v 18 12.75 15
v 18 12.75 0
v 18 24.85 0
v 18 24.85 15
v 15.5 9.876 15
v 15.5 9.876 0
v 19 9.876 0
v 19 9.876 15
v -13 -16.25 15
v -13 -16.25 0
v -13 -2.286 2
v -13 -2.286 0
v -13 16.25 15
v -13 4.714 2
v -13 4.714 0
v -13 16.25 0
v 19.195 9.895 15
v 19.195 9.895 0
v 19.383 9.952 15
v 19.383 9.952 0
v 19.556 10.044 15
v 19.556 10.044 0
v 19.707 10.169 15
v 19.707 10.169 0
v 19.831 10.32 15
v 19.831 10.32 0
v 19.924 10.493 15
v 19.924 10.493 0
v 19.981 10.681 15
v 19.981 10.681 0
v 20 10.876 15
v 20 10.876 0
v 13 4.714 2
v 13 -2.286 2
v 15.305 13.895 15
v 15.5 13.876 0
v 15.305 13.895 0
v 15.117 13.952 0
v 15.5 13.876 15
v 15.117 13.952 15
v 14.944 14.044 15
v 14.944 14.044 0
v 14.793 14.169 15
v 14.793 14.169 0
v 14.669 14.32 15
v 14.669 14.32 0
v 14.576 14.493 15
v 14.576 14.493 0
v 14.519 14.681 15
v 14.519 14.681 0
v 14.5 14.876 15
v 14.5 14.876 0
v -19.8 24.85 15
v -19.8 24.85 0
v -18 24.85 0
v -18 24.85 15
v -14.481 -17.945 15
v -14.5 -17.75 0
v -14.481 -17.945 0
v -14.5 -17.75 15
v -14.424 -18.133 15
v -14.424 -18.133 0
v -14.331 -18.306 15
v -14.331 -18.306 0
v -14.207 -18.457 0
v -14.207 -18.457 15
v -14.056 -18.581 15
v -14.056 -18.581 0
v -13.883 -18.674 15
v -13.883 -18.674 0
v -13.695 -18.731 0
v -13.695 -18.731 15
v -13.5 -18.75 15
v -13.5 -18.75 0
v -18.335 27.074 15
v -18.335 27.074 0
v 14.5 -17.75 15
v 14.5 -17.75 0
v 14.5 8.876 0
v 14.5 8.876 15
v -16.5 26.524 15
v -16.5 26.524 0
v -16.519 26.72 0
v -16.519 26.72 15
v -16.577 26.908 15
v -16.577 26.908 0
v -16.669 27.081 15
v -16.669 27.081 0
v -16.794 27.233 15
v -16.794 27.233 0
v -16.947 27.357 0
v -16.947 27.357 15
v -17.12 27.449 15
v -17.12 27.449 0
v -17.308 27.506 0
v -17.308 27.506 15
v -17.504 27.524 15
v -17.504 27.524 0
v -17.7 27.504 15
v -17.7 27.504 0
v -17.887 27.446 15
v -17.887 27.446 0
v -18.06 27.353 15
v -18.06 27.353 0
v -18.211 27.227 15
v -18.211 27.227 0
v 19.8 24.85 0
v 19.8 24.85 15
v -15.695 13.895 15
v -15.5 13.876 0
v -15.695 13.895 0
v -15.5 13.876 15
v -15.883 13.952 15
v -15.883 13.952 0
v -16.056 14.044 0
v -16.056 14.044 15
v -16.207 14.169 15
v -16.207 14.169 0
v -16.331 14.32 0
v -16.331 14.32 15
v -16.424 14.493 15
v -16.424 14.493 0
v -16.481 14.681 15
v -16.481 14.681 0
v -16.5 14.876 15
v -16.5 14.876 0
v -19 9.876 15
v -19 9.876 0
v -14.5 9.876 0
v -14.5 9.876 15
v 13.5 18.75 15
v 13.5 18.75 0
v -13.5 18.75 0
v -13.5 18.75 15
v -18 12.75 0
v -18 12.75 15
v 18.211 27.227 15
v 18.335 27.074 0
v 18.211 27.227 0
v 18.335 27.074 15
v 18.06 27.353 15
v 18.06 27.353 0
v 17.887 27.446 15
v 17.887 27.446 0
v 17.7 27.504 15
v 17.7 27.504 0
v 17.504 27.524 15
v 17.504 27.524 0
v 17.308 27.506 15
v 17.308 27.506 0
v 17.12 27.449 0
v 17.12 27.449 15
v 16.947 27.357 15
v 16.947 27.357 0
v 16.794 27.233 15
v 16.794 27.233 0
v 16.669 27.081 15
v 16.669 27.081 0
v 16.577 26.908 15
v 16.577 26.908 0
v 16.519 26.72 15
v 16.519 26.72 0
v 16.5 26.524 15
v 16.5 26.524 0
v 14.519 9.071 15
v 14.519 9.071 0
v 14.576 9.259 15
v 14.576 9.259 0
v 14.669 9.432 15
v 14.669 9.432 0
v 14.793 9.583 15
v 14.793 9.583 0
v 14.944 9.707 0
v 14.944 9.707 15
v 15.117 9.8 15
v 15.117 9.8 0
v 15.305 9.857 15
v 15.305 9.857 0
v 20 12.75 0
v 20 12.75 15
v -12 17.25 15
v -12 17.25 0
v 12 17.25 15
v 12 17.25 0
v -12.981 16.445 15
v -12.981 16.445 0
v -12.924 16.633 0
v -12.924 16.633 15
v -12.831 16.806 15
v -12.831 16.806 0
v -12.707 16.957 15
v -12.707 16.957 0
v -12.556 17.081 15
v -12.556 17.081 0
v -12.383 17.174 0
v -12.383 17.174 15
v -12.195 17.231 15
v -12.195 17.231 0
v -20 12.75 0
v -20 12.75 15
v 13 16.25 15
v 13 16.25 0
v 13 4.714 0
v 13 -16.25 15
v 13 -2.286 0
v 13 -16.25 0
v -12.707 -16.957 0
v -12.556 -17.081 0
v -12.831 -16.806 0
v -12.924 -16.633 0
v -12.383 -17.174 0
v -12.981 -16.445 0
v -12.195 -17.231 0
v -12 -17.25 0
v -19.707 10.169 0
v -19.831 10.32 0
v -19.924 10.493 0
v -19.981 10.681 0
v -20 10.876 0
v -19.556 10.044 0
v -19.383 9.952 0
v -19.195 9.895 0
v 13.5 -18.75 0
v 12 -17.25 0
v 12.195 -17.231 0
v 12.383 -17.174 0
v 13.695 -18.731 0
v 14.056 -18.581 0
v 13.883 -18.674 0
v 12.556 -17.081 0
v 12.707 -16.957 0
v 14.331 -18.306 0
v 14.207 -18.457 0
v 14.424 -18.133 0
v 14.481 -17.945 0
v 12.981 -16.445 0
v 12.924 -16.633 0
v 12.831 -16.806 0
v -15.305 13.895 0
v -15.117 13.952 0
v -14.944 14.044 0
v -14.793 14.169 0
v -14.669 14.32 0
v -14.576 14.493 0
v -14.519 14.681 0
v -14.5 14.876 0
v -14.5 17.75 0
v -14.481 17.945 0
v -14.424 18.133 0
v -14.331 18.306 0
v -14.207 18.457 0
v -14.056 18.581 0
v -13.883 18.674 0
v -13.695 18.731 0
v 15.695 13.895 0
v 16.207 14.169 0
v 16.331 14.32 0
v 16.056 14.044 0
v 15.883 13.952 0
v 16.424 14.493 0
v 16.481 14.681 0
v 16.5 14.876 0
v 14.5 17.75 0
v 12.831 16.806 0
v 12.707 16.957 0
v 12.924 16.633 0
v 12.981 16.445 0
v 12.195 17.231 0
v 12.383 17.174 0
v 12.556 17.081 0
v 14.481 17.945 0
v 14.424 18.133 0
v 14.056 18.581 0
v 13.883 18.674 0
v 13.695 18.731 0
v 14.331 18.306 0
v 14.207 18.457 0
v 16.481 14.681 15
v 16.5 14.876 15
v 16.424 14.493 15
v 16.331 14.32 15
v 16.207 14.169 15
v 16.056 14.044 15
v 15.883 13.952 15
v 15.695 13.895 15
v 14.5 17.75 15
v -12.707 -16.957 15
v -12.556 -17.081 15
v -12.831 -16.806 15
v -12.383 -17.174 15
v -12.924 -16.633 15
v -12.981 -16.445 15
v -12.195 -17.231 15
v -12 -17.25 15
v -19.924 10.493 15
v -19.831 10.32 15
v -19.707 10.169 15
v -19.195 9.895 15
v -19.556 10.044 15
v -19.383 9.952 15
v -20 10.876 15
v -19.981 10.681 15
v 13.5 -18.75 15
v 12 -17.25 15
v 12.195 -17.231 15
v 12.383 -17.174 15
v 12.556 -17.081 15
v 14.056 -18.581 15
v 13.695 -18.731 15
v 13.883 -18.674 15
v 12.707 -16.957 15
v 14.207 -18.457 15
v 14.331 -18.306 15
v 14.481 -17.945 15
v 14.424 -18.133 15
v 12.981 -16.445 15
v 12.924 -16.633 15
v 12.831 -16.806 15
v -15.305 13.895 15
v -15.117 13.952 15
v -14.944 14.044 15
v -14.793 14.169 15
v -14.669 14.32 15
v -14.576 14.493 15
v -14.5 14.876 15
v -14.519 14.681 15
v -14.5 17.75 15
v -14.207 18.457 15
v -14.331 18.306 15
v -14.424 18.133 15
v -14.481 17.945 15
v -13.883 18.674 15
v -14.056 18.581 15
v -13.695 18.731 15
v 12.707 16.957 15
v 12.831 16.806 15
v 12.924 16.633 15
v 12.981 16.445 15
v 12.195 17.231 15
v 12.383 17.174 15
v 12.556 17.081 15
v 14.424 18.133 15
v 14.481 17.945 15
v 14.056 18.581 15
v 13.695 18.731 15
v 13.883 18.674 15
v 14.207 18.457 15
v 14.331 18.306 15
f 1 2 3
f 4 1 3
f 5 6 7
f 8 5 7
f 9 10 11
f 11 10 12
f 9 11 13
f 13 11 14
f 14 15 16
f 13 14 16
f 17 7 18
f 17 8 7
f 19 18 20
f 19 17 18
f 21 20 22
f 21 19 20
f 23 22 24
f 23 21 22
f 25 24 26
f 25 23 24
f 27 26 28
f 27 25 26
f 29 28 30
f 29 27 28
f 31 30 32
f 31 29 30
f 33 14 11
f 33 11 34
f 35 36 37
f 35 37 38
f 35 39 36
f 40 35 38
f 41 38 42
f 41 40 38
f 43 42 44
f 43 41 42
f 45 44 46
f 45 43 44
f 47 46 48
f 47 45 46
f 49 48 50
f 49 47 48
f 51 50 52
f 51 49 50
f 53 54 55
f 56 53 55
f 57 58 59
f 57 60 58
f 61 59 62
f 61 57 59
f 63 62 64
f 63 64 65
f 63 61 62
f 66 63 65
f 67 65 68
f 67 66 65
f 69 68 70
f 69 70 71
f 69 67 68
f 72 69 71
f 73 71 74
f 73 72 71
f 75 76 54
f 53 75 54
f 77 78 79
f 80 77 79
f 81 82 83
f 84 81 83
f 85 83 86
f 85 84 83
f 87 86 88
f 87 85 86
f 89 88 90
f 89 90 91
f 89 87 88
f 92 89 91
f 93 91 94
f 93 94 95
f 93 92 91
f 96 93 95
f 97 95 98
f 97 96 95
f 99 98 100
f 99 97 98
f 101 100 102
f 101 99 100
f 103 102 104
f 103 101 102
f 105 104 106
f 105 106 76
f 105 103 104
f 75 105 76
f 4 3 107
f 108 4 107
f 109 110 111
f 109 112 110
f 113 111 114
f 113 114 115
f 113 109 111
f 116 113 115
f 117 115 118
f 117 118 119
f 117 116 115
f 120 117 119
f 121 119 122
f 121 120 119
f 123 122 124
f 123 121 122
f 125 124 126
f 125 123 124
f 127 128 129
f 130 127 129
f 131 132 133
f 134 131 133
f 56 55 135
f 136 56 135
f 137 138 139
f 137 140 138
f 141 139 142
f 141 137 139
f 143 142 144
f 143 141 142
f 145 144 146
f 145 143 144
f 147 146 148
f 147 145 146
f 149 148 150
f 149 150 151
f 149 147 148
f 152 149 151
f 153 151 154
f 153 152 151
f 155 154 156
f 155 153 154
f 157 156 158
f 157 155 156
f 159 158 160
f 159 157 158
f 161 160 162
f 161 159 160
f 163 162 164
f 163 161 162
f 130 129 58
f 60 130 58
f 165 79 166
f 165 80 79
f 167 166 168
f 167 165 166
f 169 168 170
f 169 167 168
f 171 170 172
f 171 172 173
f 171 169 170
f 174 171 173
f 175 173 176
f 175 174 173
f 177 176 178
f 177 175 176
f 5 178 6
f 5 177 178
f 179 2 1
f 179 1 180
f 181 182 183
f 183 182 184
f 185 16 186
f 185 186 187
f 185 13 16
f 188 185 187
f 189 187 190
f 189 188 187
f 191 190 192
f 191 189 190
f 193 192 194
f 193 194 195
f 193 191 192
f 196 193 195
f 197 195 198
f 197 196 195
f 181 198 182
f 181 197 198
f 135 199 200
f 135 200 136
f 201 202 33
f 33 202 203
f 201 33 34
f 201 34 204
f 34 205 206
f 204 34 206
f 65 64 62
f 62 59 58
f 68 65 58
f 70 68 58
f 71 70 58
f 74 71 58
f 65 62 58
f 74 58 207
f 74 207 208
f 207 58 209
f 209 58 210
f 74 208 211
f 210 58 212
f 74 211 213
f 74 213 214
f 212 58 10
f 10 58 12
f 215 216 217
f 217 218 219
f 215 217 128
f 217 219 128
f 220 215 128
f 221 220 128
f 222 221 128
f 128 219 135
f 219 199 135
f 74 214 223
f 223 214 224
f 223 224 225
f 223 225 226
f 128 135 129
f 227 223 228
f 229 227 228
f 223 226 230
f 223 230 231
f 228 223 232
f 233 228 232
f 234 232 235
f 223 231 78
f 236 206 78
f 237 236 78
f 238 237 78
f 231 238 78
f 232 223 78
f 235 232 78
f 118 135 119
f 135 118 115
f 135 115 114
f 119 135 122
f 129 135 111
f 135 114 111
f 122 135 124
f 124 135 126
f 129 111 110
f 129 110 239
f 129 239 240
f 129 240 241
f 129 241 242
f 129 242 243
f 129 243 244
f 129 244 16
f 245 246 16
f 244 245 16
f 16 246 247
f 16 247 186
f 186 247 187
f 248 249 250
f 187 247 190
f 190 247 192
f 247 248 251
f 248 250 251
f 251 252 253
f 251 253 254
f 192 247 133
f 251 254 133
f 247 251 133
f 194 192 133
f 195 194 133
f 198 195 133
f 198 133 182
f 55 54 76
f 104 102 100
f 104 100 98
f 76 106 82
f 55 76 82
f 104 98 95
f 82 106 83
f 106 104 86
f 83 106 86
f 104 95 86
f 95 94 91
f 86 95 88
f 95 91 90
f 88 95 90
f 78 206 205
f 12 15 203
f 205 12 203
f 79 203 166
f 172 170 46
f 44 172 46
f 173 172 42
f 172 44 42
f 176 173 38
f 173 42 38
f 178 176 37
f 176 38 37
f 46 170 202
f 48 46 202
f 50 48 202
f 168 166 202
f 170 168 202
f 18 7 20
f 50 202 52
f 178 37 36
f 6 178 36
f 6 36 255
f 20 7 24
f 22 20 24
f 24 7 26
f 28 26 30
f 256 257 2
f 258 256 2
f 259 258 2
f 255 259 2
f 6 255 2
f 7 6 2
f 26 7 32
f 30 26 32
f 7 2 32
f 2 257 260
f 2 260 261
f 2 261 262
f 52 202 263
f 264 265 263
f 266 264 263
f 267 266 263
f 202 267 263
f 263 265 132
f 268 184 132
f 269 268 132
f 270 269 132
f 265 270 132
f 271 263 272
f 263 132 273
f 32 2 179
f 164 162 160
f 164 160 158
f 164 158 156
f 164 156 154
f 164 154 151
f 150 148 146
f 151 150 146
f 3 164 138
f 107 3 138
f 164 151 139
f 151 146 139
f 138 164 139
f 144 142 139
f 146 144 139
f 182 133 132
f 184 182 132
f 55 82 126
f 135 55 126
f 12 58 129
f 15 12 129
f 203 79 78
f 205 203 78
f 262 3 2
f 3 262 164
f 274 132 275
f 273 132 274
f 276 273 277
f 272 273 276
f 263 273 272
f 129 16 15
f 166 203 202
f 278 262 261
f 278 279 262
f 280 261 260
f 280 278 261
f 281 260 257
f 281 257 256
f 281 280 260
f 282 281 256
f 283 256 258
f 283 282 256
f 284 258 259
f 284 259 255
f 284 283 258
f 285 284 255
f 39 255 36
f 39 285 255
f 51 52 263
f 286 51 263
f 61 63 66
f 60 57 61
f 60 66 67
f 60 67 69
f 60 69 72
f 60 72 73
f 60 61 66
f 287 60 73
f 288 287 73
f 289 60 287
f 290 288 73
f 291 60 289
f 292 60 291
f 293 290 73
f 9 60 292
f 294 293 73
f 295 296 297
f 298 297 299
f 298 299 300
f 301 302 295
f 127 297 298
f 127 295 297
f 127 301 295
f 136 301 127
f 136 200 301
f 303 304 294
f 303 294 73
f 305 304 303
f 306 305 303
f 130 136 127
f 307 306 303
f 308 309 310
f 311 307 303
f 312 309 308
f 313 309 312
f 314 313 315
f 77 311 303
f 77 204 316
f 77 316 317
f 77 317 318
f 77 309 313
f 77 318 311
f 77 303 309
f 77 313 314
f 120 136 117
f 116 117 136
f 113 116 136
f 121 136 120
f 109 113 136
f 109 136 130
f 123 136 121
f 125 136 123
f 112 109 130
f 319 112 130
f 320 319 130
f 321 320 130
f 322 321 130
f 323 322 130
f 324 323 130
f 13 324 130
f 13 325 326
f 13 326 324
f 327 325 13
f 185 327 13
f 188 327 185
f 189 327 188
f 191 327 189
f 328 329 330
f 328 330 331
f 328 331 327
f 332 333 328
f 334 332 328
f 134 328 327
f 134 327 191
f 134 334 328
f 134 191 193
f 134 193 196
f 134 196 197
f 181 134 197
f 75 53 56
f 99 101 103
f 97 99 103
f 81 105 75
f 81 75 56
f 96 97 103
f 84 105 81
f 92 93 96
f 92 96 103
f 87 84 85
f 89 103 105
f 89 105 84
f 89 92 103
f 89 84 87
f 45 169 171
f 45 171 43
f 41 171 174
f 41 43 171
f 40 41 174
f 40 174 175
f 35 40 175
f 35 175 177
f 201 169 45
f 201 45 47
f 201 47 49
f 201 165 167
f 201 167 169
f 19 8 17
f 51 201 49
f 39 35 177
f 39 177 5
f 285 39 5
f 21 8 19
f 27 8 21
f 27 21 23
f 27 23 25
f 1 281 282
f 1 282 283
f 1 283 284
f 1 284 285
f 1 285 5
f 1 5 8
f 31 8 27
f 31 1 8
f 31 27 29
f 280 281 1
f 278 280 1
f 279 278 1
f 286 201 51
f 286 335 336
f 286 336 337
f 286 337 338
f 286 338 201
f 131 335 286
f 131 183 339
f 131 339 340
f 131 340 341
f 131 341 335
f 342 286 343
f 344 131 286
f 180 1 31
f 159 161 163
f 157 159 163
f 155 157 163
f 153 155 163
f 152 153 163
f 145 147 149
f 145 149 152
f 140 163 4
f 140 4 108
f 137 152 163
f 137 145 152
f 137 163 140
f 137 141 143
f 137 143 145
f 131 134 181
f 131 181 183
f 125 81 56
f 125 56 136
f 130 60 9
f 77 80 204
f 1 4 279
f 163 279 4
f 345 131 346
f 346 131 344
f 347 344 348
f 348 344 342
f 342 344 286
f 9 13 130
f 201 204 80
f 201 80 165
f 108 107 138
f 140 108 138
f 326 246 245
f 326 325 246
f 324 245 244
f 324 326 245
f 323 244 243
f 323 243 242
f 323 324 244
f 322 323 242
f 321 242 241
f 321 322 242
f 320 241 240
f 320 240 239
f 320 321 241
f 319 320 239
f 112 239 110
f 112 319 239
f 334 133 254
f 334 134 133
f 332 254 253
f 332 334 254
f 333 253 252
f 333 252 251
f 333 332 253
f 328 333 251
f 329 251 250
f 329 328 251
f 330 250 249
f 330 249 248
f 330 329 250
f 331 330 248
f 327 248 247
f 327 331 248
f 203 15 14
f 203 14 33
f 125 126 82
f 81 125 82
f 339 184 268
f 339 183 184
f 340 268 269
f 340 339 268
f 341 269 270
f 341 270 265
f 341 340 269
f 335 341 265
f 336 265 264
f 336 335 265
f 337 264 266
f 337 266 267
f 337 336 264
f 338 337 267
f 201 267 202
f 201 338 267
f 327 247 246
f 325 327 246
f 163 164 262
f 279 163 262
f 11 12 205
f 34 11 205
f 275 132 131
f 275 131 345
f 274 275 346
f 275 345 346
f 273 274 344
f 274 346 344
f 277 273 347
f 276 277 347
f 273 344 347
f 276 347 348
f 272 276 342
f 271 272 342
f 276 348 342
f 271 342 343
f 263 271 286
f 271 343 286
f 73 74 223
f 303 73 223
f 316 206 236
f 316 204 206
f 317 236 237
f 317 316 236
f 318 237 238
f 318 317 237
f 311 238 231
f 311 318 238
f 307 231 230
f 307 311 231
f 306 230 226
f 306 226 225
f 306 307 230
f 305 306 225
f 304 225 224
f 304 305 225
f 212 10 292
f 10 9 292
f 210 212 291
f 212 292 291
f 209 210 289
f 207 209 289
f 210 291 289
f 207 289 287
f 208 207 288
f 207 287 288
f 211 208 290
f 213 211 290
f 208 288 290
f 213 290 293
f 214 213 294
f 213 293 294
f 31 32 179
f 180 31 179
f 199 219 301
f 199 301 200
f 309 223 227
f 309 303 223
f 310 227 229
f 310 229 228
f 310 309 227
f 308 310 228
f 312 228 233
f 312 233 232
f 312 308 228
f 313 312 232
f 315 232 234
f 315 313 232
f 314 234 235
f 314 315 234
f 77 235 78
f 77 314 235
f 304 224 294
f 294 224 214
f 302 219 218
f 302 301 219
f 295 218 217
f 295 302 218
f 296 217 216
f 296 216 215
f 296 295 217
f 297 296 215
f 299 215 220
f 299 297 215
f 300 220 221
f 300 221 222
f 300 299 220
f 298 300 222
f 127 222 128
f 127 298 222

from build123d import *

# Parameters (mm, degrees)
F0_W     = 2
F0_H     = 4
F0_H_2   = 2.8740456328
F1_DEPTH = 15
F2_R     = 0.99999
F0_W_2   = 26
F0_H_3   = 7
F3_DEPTH = 2


# Not quite as in the source:
# - a fillet or chamfer is up to 0.001 mm smaller than in the source, because OpenCascade refuses the exact size


with BuildPart() as f1:
    # F0 (on Top) → F1 (new body)
    with BuildSketch(Plane.XY):
        Polygon((14.5, 18.75), (-14.5, 18.75), (-14.5, 13.8759543672), (-14.5, 9.8759543672), (-14.5, -18.75), (14.5, -18.75), (14.5, 9.8759543672), (14.5, 13.8759543672), align=None)
        Polygon((-13, 4.7144976147), (-13, 17.25), (13, 17.25), (13, 4.7144976147), (13, -2.2855023853), (13, -17.25), (-13, -17.25), (-13, -2.2855023853), align=None, mode=Mode.SUBTRACT)
        with Locations((-15.5, 11.8759543672)):
            Rectangle(F0_W, F0_H)
        Polygon((-16.5, 9.8759543672), (-16.5, 13.8759543672), (-16.5, 29.8609879265), (-19.8, 24.85), (-18, 24.85), (-18, 12.75), (-18, 9.8759543672), align=None)
        with Locations((15.5, 11.8759543672)):
            Rectangle(F0_W, F0_H)
        Polygon((16.5, 29.8609879265), (16.5, 13.8759543672), (16.5, 9.8759543672), (18, 9.8759543672), (18, 12.75), (18, 24.85), (19.8, 24.85), align=None)
        with Locations((-19, 11.3129771836)):
            Rectangle(F0_W, F0_H_2)
        with Locations((19, 11.3129771836)):
            Rectangle(F0_W, F0_H_2)
    extrude(amount=F1_DEPTH)

    # F2 (radius 1 in the source; OpenCascade refuses exactly that, so slightly less here)
    f2_edges = [f1.edges().sort_by_distance(p)[0] for p in [
        (-14.5, 18.75, 7.5),
        (-20, 9.875954, 7.5),
        (14.5, 18.75, 7.5),
        (20, 9.875954, 7.5),
        (-13, 17.25, 7.5),
        (14.5, 9.875954, 7.5),
        (14.5, -18.75, 7.5),
        (-14.5, -18.75, 7.5),
        (-13, -17.25, 7.5),
        (13, 17.25, 7.5),
        (13, -17.25, 7.5),
        (-14.5, 13.875954, 7.5),
        (16.5, 13.875954, 7.5),
        (-16.5, 13.875954, 7.5),
        (14.5, 13.875954, 7.5),
        (-16.5, 29.860988, 7.5),
        (16.5, 29.860988, 7.5),
    ]]
    fillet(f2_edges, radius=F2_R)

    # F0 (on Top) → F3 (join)
    with BuildSketch(Plane.XY):
        with Locations((0, 1.2144976147)):
            Rectangle(F0_W_2, F0_H_3)
    extrude(amount=F3_DEPTH)


solid = f1.part
